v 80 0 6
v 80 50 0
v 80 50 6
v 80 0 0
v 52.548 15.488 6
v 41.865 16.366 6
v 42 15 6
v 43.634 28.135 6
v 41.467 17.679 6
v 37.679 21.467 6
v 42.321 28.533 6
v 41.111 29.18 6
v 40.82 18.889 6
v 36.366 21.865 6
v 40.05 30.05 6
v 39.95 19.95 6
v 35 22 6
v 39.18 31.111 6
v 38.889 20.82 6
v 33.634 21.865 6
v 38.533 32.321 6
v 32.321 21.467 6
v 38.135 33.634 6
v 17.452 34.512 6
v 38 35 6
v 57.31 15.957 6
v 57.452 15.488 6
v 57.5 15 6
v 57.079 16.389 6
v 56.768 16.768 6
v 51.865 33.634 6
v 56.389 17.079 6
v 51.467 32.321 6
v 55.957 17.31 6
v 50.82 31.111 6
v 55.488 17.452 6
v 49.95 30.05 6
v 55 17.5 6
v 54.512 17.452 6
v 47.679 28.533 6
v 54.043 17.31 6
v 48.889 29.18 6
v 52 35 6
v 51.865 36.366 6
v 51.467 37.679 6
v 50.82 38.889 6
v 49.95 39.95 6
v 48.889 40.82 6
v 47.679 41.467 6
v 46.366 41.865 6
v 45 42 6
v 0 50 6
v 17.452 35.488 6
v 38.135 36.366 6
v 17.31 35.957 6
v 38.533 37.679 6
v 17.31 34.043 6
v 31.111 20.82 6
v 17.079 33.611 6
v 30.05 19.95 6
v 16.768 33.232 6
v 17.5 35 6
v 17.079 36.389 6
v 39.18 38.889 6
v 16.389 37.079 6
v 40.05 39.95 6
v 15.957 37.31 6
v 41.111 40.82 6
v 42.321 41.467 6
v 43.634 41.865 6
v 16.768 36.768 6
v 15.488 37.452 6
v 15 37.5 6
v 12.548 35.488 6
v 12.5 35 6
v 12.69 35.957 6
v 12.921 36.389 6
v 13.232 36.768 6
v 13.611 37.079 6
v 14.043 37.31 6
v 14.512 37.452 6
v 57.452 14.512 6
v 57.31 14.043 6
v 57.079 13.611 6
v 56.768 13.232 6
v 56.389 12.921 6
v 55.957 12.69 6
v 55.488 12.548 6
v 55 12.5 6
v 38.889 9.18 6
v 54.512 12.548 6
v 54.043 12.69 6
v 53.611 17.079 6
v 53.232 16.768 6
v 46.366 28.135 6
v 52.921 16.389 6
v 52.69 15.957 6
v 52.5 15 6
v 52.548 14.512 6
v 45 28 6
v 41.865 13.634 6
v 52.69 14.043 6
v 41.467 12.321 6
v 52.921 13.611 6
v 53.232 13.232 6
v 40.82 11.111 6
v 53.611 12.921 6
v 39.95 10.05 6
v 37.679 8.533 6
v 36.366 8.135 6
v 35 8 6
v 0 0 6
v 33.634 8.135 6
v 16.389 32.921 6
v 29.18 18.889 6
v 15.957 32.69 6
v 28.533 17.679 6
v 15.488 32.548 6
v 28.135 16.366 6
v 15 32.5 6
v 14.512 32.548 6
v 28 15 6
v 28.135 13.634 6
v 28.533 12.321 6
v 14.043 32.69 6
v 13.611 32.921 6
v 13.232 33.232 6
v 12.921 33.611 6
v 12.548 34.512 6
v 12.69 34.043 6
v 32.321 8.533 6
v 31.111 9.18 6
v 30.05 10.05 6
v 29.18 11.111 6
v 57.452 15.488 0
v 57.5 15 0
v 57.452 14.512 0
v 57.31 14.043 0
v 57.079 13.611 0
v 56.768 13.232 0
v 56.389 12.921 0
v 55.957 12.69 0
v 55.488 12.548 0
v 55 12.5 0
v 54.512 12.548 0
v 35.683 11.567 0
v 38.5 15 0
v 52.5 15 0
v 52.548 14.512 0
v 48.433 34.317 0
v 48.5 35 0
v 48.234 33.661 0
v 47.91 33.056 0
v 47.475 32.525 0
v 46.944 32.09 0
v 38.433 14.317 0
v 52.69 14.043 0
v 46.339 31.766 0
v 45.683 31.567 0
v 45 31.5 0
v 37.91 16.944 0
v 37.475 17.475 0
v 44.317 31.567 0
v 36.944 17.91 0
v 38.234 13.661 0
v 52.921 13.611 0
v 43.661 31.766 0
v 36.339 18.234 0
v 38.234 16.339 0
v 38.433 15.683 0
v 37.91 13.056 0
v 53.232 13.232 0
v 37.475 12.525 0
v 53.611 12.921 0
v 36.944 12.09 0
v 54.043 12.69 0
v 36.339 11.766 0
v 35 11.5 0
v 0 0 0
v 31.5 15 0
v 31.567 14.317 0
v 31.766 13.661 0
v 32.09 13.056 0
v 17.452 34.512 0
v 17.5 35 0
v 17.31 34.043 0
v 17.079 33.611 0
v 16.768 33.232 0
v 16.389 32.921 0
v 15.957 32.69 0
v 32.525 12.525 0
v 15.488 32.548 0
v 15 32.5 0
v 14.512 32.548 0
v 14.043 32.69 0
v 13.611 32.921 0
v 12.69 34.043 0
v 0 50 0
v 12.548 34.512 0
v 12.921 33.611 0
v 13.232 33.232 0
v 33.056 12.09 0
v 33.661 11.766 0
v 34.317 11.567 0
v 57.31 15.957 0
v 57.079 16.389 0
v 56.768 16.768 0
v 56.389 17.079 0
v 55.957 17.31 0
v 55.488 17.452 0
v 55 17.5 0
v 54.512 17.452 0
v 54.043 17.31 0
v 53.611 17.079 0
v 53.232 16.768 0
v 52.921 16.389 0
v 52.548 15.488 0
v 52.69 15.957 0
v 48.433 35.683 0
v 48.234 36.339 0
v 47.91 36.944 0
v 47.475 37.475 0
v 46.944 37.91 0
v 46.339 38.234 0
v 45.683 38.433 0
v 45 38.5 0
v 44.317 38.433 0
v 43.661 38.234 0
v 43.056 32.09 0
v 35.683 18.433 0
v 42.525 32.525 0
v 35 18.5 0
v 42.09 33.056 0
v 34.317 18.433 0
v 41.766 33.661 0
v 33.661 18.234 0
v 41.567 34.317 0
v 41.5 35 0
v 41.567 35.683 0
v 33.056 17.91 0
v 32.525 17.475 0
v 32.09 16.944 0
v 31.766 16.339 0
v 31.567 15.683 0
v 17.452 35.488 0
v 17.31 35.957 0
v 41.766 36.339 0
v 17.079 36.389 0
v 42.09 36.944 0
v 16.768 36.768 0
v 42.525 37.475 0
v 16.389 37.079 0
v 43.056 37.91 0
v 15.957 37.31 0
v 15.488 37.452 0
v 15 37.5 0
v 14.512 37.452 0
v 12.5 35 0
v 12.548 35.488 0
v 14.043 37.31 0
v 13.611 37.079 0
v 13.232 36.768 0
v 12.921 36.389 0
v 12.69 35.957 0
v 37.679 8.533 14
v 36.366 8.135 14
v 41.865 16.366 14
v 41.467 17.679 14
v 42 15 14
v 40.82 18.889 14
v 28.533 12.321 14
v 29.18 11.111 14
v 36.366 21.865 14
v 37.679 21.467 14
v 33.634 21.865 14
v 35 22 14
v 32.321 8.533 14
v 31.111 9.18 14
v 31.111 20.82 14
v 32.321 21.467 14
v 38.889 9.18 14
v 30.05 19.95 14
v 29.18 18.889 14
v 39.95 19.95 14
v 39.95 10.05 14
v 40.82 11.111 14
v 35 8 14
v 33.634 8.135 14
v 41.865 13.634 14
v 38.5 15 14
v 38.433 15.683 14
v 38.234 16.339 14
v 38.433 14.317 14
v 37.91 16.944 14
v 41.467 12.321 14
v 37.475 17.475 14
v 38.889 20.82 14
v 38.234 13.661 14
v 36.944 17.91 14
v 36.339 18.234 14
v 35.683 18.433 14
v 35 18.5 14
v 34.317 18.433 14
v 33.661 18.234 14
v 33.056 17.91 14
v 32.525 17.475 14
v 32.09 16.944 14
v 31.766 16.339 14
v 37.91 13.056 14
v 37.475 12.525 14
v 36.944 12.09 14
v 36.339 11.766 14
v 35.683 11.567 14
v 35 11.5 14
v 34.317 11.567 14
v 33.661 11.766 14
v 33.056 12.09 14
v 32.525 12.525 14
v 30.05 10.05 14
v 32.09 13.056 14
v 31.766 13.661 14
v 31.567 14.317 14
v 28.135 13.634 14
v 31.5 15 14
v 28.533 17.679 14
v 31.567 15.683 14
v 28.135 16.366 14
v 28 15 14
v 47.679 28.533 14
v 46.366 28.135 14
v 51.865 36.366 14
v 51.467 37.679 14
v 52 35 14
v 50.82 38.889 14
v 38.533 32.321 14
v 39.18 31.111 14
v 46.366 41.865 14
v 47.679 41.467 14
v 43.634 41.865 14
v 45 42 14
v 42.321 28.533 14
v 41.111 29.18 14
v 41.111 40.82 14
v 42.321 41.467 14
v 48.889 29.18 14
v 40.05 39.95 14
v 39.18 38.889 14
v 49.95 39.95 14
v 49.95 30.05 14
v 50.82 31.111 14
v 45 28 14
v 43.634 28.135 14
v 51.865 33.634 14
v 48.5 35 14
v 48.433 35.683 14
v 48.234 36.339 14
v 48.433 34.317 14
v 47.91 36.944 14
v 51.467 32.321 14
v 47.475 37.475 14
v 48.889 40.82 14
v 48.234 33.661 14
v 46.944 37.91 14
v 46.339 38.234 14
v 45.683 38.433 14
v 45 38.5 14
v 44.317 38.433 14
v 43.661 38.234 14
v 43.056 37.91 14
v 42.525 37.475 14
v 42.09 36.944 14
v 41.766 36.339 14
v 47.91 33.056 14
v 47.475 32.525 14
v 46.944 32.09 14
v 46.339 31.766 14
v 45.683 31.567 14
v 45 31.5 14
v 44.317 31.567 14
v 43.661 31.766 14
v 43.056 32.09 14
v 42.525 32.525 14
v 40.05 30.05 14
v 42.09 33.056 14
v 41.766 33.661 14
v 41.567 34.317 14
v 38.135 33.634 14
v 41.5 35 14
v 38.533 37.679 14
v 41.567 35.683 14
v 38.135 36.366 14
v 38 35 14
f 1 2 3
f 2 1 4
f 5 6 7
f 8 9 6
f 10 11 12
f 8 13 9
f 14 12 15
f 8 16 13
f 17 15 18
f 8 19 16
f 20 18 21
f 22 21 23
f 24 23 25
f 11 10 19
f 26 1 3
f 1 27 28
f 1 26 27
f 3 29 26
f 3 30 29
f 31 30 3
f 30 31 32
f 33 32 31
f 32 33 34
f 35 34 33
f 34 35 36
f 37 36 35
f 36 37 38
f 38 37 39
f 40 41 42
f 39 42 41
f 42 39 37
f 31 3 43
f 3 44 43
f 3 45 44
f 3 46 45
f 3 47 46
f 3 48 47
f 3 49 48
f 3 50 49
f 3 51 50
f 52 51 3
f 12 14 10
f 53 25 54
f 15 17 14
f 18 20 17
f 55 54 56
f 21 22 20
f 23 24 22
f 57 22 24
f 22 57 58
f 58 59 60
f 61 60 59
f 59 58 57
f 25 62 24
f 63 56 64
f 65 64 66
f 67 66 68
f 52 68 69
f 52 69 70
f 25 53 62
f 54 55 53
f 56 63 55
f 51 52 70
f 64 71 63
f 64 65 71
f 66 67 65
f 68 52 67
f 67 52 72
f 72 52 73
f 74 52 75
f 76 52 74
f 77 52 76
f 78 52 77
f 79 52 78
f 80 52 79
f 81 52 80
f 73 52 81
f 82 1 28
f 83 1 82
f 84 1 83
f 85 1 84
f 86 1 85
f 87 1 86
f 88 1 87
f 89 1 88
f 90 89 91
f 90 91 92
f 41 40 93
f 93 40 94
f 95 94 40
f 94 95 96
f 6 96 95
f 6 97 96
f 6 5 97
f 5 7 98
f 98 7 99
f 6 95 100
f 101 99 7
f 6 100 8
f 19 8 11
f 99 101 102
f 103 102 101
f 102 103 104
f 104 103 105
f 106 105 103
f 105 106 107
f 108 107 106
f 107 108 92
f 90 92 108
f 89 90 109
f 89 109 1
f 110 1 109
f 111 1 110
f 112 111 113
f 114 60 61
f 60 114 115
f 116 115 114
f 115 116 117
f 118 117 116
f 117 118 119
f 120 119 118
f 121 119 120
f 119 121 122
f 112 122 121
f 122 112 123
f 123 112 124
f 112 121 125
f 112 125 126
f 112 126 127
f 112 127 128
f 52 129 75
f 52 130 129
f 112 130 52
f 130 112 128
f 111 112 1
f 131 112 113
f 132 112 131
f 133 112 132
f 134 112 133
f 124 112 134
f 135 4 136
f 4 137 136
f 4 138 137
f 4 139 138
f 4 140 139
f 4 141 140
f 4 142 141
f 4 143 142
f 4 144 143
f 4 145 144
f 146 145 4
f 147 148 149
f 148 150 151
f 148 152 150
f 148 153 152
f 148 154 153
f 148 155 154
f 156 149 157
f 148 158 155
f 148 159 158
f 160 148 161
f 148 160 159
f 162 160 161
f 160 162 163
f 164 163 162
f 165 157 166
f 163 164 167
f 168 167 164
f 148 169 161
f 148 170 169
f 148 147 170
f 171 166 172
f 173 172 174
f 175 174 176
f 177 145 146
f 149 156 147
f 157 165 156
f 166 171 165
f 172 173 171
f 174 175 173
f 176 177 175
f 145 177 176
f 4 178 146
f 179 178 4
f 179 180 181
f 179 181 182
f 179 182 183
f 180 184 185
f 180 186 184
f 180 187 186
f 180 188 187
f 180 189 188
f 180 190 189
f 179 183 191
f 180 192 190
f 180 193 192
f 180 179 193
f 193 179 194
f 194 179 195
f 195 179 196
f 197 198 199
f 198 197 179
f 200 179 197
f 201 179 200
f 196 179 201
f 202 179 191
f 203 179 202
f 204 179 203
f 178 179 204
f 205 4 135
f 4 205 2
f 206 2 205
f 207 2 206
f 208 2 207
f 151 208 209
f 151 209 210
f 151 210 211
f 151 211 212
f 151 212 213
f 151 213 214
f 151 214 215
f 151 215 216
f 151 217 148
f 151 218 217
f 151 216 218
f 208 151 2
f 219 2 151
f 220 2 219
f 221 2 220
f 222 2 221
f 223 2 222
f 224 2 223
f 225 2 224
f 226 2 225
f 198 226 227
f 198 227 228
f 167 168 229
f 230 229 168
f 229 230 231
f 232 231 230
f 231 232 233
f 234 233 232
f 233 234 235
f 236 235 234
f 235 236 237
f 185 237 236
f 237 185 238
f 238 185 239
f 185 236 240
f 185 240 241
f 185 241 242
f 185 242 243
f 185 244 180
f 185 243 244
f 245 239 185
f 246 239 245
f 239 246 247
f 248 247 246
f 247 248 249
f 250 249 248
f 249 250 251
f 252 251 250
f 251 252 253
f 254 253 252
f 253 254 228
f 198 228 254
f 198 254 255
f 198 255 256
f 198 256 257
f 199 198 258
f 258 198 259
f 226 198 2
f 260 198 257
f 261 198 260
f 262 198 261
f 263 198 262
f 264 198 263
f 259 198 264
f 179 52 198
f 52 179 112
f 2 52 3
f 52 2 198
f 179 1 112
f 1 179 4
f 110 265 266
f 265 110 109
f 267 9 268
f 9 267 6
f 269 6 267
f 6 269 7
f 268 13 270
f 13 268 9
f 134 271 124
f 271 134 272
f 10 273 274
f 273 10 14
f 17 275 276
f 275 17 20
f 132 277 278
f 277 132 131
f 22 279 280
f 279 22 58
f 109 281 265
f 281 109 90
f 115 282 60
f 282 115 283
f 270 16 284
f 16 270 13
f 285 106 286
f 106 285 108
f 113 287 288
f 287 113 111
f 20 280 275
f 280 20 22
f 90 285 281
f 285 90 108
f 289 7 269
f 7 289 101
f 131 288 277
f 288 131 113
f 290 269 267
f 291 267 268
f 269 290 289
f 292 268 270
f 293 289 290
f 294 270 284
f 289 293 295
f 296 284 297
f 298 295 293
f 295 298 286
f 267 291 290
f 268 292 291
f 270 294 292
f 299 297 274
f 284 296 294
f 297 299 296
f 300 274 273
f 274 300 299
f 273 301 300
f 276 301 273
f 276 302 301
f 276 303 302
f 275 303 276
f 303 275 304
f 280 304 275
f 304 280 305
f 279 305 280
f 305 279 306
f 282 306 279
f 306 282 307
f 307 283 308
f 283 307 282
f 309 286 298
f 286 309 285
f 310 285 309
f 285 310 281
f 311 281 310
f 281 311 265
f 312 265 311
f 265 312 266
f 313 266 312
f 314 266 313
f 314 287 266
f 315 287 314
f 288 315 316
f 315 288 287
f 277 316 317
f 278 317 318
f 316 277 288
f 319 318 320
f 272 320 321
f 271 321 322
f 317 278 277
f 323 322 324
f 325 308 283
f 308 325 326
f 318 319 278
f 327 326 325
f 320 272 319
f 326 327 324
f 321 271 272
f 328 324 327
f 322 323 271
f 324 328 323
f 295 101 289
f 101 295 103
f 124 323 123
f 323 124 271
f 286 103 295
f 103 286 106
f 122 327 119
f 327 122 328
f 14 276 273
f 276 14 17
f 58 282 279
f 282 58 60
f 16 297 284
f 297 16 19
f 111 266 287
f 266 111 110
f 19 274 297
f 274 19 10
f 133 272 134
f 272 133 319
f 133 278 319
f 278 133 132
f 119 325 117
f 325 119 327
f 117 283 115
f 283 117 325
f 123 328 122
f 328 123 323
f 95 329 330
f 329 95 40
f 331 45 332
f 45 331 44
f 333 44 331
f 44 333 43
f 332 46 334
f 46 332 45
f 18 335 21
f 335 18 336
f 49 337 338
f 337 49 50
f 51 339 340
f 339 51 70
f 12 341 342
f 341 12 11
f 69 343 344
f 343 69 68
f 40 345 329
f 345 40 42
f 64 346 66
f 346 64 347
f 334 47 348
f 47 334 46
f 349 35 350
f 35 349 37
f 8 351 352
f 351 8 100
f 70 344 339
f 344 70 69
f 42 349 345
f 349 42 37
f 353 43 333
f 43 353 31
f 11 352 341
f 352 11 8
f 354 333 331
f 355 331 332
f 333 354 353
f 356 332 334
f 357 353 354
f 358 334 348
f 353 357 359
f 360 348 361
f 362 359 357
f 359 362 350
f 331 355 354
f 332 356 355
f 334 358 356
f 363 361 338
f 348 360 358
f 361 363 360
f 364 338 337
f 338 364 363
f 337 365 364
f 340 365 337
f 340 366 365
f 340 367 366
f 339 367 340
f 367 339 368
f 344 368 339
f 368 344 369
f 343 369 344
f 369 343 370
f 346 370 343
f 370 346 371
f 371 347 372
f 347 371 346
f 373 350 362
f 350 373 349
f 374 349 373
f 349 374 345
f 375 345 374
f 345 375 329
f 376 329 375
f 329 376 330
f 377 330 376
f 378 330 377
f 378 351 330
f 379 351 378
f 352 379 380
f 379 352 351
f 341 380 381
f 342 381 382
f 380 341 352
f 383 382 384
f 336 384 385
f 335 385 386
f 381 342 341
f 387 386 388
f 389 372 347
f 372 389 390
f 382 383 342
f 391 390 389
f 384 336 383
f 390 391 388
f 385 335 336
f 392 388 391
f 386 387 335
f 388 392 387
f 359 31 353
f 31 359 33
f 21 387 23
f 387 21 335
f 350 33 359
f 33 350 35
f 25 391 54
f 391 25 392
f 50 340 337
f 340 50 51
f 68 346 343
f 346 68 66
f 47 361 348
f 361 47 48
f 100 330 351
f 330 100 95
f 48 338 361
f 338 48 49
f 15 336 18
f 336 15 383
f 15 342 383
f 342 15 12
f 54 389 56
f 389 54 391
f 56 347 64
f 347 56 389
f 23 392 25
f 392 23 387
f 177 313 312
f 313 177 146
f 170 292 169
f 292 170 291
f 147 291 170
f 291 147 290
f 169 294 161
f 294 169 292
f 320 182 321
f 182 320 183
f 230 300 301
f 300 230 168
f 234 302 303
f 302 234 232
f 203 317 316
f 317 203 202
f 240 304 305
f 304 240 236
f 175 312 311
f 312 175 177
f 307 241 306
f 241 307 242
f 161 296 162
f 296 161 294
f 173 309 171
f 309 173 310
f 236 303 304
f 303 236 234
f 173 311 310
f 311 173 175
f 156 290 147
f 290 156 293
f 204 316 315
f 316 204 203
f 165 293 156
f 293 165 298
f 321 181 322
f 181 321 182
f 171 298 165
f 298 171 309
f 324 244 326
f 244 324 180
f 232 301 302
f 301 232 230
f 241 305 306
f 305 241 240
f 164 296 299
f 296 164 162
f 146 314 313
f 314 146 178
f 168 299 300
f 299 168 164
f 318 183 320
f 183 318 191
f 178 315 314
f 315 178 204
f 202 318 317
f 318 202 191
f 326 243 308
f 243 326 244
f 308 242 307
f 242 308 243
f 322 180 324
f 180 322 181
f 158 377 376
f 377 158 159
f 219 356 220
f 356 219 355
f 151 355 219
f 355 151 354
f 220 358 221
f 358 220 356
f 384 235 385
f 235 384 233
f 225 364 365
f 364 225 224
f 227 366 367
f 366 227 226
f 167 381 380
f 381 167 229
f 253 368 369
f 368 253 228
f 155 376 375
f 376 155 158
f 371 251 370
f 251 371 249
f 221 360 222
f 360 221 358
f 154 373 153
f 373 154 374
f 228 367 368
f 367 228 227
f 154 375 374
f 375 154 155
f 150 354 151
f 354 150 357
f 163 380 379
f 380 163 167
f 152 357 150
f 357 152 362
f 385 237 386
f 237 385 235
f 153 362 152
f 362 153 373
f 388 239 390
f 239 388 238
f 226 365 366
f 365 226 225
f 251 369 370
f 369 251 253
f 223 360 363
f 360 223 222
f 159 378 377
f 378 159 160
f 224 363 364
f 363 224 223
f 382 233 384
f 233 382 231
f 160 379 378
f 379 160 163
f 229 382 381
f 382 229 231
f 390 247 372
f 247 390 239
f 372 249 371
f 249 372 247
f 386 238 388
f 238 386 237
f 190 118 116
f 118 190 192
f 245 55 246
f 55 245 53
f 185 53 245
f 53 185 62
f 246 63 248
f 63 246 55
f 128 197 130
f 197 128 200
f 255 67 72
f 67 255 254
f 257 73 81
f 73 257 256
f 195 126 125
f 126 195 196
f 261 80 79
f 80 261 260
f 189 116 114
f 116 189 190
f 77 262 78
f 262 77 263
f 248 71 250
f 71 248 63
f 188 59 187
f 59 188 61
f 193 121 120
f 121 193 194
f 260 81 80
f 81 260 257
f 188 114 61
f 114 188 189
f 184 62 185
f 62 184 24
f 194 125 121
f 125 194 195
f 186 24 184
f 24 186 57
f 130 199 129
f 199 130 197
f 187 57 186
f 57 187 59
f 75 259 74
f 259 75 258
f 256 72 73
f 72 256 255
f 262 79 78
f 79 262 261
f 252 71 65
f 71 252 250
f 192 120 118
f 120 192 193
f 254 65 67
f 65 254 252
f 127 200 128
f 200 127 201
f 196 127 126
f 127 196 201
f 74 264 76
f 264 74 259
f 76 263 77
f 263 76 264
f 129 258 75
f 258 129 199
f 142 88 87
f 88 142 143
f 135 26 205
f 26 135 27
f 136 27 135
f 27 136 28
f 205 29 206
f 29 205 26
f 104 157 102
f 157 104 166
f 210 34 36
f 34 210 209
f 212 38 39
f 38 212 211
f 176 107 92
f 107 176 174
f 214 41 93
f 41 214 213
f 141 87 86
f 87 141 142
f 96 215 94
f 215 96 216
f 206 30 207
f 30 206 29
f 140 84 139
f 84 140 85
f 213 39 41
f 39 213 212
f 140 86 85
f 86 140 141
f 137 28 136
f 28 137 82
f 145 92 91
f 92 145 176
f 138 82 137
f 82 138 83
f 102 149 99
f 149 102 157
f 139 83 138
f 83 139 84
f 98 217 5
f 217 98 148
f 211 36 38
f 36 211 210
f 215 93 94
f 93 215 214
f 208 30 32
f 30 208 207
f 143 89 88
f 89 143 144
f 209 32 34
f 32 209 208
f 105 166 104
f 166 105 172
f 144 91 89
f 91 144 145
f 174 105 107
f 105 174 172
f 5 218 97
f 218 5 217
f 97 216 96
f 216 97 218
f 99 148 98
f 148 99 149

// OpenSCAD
$fn = 32;

// ----------------------------------------------------------------------
// Mixed field: bosses and holes at given coordinates
// ----------------------------------------------------------------------

// --- parameters (mm) ---
plate_l = 80;             // plate length, X
plate_w = 50;             // plate width, Y
plate_t = 6;              // plate thickness, Z
boss_d = 14;              // boss diameter
boss_h = 8;               // boss height above the plate
hole_d = 5;               // through hole diameter

total_h = plate_t + boss_h;  // overall height

difference() {
  union() {
    cube([plate_l, plate_w, plate_t]);
    translate([35, 15, plate_t]) cylinder(h = boss_h, d = boss_d);
    translate([45, 35, plate_t]) cylinder(h = boss_h, d = boss_d);
  }
  translate([35, 15, -1]) cylinder(h = total_h + 2, d = boss_d / 2);
  translate([45, 35, -1]) cylinder(h = total_h + 2, d = boss_d / 2);
  translate([15, 35, -1]) cylinder(h = plate_t + 2, d = hole_d);
  translate([55, 15, -1]) cylinder(h = plate_t + 2, d = hole_d);
}
